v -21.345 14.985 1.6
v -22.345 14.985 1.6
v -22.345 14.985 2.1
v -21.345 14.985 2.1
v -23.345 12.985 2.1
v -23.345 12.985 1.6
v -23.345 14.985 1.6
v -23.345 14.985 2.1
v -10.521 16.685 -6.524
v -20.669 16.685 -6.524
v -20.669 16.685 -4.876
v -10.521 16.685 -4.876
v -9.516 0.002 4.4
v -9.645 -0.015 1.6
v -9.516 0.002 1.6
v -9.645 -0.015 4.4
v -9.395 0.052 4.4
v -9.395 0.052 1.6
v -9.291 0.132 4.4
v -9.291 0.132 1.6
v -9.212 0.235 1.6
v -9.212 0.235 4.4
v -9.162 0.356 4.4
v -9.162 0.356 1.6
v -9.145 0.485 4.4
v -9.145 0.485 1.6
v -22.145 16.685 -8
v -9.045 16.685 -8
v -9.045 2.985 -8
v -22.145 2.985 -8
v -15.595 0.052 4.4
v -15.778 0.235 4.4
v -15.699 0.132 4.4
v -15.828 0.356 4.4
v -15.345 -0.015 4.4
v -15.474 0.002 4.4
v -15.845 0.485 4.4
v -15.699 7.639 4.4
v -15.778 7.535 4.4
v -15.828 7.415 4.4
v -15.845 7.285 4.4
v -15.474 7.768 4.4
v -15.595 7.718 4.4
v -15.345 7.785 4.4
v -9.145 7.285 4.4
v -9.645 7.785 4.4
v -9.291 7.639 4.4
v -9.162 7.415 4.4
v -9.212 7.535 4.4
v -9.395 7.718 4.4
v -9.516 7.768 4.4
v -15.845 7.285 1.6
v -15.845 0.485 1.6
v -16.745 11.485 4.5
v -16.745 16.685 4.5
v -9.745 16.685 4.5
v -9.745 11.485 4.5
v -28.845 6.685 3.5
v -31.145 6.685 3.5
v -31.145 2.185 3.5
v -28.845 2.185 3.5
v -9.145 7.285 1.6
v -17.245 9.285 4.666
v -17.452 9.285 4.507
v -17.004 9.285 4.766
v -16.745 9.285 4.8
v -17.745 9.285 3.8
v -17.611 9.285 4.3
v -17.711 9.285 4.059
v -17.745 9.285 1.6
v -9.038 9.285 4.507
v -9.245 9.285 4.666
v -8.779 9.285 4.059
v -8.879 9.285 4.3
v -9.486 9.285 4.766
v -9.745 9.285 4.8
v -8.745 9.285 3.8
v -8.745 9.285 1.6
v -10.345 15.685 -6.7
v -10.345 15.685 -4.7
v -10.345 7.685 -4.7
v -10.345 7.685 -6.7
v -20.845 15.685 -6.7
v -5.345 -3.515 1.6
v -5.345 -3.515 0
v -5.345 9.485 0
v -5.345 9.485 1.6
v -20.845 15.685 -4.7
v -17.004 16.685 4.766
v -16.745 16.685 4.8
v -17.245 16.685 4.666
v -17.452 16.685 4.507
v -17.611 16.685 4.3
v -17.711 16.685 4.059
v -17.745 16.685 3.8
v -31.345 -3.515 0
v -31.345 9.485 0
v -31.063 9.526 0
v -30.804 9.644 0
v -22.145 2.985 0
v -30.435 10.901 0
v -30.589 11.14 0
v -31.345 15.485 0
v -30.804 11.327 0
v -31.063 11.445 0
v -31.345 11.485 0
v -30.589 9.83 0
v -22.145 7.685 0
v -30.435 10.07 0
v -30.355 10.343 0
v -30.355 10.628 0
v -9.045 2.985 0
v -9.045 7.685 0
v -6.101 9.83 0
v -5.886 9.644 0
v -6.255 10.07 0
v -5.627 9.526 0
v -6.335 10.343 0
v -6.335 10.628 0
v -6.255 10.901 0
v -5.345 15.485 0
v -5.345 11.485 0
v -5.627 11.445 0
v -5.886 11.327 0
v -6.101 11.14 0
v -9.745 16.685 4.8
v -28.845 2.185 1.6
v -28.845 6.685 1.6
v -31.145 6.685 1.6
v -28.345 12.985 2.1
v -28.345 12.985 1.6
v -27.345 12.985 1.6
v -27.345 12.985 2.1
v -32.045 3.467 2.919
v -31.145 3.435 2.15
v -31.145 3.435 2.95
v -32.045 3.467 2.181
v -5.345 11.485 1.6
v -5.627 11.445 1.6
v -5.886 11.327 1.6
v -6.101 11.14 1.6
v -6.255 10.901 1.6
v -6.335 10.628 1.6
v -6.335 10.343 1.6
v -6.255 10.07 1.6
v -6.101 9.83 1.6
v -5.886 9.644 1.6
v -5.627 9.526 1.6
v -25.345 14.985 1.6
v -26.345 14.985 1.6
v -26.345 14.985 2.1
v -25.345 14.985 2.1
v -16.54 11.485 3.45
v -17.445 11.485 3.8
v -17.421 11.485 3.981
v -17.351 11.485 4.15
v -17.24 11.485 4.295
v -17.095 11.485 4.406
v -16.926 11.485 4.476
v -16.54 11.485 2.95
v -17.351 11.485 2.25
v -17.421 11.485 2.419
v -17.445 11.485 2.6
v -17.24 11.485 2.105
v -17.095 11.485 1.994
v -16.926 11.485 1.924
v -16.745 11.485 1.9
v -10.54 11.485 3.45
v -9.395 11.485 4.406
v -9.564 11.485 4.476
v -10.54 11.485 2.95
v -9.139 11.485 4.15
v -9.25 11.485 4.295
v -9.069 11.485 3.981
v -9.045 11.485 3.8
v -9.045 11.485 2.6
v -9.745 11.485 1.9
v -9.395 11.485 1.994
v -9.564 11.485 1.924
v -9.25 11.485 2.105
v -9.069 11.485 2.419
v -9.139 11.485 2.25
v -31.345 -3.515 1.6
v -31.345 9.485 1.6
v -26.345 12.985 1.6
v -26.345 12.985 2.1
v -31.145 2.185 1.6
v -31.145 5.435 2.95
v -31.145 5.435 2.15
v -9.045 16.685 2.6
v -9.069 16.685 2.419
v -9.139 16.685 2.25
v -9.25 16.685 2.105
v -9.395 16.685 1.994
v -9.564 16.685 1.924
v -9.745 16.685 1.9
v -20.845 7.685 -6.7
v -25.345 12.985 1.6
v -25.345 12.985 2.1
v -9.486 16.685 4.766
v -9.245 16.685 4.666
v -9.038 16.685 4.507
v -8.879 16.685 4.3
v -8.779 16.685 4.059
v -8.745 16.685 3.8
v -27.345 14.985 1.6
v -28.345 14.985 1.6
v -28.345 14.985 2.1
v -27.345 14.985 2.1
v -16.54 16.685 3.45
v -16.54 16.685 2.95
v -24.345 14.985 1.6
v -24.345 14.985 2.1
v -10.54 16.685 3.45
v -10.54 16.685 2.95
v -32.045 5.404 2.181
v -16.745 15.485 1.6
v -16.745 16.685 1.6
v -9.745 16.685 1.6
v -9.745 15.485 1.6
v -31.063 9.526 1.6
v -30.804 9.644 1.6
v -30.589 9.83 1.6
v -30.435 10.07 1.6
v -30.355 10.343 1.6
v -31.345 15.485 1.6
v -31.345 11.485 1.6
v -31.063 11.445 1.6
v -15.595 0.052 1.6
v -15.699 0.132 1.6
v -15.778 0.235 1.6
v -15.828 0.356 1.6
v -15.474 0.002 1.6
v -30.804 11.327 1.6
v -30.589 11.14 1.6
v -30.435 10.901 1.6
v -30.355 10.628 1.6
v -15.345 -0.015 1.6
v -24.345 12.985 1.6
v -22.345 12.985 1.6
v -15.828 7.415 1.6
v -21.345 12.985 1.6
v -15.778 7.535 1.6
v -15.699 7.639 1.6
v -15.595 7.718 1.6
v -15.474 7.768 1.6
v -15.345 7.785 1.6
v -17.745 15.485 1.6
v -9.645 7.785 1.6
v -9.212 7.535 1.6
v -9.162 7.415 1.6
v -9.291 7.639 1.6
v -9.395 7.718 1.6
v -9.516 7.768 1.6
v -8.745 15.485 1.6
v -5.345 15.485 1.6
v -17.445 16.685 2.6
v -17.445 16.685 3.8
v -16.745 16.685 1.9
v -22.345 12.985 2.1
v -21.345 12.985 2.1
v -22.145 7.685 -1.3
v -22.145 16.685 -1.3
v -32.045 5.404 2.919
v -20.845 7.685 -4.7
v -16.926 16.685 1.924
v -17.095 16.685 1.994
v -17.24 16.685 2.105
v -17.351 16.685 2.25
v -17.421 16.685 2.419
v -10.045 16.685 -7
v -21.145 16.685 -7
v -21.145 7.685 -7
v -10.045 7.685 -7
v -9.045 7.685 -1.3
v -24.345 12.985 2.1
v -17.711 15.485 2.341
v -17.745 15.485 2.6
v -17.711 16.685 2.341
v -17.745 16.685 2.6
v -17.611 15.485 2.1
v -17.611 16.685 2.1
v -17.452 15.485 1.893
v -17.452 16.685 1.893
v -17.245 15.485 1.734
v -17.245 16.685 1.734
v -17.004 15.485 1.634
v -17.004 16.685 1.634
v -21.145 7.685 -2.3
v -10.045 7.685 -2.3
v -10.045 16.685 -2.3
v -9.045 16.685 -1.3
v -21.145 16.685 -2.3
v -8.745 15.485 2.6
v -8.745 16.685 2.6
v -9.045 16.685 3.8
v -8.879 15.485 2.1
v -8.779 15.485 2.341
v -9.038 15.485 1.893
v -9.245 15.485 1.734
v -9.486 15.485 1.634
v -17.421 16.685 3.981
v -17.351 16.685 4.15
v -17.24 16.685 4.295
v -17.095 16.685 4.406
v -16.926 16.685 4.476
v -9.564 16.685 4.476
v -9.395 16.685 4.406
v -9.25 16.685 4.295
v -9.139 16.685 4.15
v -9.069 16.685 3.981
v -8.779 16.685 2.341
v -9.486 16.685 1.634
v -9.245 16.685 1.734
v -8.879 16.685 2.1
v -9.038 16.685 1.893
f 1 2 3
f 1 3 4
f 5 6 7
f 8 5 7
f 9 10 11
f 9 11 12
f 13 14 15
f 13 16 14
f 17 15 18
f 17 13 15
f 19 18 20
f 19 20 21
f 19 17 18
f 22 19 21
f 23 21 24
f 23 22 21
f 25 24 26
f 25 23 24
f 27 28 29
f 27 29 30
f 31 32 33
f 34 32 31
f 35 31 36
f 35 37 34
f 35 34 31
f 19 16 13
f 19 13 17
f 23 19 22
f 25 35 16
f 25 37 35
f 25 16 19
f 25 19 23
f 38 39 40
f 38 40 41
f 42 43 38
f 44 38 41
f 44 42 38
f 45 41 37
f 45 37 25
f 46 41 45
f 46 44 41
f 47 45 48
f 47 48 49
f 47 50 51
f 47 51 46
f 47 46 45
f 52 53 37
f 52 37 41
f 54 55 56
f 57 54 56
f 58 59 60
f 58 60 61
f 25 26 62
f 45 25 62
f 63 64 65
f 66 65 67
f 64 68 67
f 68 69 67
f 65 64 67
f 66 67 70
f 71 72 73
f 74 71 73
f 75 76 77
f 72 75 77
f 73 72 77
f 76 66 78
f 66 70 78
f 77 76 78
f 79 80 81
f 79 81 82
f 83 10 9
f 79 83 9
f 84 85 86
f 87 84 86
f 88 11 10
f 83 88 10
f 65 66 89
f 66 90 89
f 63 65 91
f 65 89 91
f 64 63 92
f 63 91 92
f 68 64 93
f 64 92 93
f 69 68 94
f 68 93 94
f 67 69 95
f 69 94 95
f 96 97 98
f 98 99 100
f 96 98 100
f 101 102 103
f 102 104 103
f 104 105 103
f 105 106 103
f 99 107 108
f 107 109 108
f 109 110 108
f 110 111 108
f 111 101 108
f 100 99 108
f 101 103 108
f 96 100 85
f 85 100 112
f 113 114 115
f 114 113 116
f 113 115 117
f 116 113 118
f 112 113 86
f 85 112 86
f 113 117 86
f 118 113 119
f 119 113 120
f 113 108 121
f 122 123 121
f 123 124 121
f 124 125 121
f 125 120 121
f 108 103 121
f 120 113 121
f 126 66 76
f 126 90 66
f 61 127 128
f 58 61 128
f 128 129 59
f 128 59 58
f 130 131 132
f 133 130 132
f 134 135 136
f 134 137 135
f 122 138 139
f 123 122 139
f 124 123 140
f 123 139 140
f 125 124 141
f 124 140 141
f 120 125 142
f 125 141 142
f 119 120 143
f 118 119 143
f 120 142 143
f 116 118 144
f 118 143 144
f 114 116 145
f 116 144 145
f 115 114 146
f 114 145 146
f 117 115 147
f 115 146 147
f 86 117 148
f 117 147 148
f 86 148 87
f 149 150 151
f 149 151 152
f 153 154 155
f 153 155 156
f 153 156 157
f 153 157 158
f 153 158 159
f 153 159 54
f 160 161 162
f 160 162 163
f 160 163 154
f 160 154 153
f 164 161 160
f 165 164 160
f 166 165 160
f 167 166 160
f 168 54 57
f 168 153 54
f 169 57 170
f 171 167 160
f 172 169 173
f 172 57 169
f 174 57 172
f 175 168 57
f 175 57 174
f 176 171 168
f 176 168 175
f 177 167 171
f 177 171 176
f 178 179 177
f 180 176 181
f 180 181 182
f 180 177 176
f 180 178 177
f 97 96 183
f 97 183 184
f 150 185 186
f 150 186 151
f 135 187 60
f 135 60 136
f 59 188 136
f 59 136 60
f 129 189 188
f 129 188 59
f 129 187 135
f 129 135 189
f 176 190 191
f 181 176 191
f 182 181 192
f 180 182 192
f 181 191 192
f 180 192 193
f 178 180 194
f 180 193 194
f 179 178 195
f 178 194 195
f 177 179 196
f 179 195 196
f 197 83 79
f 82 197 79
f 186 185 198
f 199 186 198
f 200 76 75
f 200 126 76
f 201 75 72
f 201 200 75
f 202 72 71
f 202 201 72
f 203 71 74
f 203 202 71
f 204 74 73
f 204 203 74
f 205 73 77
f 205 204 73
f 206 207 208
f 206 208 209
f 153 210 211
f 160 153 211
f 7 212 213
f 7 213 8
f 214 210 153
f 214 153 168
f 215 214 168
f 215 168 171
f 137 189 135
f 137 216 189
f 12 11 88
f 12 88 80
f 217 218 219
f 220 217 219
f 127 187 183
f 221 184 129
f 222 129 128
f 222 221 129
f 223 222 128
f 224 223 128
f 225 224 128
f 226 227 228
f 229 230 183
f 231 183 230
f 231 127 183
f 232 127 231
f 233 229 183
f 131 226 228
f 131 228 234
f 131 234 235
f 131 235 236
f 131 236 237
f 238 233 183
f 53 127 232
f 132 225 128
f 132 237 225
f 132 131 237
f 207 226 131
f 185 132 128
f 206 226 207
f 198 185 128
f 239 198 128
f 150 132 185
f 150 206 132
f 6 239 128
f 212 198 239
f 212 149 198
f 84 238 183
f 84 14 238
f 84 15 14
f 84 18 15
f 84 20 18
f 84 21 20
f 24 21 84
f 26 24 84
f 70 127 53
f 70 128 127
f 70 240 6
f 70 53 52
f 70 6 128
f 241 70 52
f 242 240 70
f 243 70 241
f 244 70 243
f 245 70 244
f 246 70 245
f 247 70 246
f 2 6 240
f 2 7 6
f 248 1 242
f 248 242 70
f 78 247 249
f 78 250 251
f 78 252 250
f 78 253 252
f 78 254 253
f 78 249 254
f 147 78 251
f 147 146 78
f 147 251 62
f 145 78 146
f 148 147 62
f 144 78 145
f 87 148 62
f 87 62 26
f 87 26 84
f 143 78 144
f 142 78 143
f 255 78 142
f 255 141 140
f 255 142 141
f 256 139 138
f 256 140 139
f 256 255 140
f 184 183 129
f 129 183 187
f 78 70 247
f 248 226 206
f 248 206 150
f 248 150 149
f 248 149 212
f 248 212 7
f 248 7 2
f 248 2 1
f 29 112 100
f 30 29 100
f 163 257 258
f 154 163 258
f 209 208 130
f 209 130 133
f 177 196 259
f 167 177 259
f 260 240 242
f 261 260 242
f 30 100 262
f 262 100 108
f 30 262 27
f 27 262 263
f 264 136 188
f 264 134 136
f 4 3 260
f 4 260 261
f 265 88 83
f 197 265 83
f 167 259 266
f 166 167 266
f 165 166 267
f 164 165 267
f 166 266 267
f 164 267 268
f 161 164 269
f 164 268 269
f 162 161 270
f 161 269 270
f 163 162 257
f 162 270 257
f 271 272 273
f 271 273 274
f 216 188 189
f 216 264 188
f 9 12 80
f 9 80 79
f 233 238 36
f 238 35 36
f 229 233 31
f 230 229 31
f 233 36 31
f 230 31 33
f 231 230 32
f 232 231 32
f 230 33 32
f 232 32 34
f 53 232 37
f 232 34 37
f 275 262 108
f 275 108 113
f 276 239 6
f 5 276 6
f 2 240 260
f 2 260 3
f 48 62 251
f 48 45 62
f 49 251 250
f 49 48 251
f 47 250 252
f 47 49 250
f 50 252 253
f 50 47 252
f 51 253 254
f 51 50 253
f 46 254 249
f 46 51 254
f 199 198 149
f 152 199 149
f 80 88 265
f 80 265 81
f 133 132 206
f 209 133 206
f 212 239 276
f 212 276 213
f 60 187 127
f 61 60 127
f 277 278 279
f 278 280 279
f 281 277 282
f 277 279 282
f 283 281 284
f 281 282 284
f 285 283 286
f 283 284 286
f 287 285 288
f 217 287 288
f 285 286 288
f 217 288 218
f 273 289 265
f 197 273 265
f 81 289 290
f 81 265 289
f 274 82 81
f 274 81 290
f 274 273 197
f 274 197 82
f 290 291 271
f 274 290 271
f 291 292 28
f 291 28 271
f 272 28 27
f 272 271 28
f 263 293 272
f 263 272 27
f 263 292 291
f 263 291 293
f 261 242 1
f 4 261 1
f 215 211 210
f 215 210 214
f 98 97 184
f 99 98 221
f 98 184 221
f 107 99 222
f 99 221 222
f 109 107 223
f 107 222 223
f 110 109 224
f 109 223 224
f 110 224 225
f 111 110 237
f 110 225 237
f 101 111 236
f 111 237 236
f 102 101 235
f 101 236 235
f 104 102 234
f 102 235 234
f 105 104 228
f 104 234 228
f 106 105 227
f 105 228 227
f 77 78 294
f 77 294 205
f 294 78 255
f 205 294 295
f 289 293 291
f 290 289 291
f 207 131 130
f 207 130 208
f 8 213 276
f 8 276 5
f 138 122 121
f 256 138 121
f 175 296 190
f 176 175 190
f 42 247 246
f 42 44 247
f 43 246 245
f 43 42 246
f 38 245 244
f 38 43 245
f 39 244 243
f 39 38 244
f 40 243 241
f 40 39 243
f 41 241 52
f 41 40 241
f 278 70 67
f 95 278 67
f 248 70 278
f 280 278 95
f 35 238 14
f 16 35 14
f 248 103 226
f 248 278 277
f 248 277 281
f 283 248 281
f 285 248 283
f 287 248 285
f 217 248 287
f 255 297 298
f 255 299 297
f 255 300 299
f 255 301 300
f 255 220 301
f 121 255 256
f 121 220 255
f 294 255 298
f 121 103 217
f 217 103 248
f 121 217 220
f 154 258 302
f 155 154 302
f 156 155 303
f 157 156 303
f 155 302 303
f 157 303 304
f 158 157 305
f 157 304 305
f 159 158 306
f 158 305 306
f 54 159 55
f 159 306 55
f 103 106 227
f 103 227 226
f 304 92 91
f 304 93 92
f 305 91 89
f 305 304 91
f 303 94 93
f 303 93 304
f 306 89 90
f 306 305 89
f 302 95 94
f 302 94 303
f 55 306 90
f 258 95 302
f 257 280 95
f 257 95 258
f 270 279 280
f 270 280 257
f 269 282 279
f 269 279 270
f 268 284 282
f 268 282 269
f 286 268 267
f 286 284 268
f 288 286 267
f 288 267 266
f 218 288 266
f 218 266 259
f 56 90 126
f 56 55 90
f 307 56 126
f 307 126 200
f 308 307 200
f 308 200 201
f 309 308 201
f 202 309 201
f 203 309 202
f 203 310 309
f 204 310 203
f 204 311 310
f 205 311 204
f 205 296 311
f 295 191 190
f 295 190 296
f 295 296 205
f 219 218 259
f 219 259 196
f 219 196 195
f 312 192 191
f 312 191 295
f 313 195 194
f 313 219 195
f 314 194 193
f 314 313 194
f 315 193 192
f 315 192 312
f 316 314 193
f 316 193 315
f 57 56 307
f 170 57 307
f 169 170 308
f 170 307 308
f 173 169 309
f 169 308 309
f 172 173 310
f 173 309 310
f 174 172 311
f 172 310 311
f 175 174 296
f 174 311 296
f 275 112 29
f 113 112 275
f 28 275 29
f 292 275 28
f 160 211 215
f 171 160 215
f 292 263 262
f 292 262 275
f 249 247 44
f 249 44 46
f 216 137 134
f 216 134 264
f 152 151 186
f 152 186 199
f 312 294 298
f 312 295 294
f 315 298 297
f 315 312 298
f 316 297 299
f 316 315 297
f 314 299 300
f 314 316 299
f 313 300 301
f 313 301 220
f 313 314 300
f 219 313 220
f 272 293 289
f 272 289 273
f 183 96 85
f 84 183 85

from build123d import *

# Parameters (mm, degrees)
ESBO_O1_W                = 26
ESBO_O1_H                = 19
RESSALTO_EXTRUS_O1_DEPTH = 1.6
ESBO_O2_W                = 1
ESBO_O2_H                = 2
RESSALTO_EXTRUS_O2_DEPTH = 0.5
ESBO_O3_W                = 9
ESBO_O3_H                = 7.4
RESSALTO_EXTRUS_O3_DEPTH = 3.2
FILETE1_R                = 1
FILETE7_R                = 1
CORTE_EXTRUS_O1_DEPTH    = 5.2
RESSALTO_EXTRUS_O4_REACH = 22.2
ESBO_O5_W                = 6
ESBO_O5_H                = 0.5
ESBO_O6_W                = 6.7
ESBO_O6_H                = 7.8
RESSALTO_EXTRUS_O5_DEPTH = 2.8
FILETE8_R                = 0.5
ESBO_O7_W                = 2.3
ESBO_O7_H                = 4.5
RESSALTO_EXTRUS_O6_DEPTH = 1.9
ESBO_O8_W                = 0.8
ESBO_O8_H                = 2
RESSALTO_EXTRUS_O7_DEPTH = 0.9
RESSALTO_EXTRUS_O7_TAPER = 2
ESBO_O9_W                = 13.1
ESBO_O9_H                = 13.7
RESSALTO_EXTRUS_O8_DEPTH = 8
ESBO_O10_W               = 13.1
ESBO_O10_H               = 1.3
CORTE_EXTRUS_O2_DEPTH    = 9
ESBO_O11_W               = 11.1
ESBO_O11_H               = 4.7
CORTE_EXTRUS_O3_DEPTH    = 9
RESSALTO_EXTRUS_O9_REACH = 22.2
ESBO_O12_W               = 10.5
ESBO_O12_H               = 2
CHANFRO1_SIZE            = 1
CHANFRO1_SIZE2           = 0.176326981
CHANFRO1_PART_2_SIZE     = 1
CHANFRO1_PART_2_SIZE2    = 0.176326981
CHANFRO1_PART_3_SIZE     = 1
CHANFRO1_PART_3_SIZE2    = 0.176326981
CHANFRO1_PART_4_SIZE     = 1
CHANFRO1_PART_4_SIZE2    = 0.176326981
CORTE_EXTRUS_O4_REACH    = 11.6
ESBO_O13_R               = 1


with BuildPart() as part:
    # Esboço1 → Ressalto-extrusão1 (new body)
    with BuildSketch(Plane.XY):
        with Locations((-18.344966746, 5.985294118)):
            Rectangle(ESBO_O1_W, ESBO_O1_H)
    extrude(amount=RESSALTO_EXTRUS_O1_DEPTH)

    # Esboço2 → Ressalto-extrusão2 (add)
    with BuildSketch(Plane.XY.offset(1.6)):
        with Locations((-27.844966746, 13.985294118)):
            Rectangle(ESBO_O2_W, ESBO_O2_H)
        with Locations((-25.844966746, 13.985294118)):
            Rectangle(ESBO_O2_W, ESBO_O2_H)
        with Locations((-23.844966746, 13.985294118)):
            Rectangle(ESBO_O2_W, ESBO_O2_H)
        with Locations((-21.844966746, 13.985294118)):
            Rectangle(ESBO_O2_W, ESBO_O2_H)
    extrude(amount=RESSALTO_EXTRUS_O2_DEPTH)

    # Esboço3 → Ressalto-extrusão3 (add)
    with BuildSketch(Plane.XY.offset(1.6)):
        with Locations((-13.244966746, 12.985294118)):
            Rectangle(ESBO_O3_W, ESBO_O3_H)
    extrude(amount=RESSALTO_EXTRUS_O3_DEPTH)

    # Filete1
    filete1_edges = [part.edges().sort_by_distance(p)[0] for p in [
        (-8.744966746, 12.985294118, 4.8),
    ]]
    fillet(filete1_edges, radius=FILETE1_R)

    # Filete7
    filete7_edges = [part.edges().sort_by_distance(p)[0] for p in [
        (-17.744966746, 16.085294118, 1.6),
        (-8.744966746, 16.085294118, 1.6),
        (-17.744966746, 12.985294118, 4.8),
    ]]
    fillet(filete7_edges, radius=FILETE7_R)

    # Esboço4 → Corte-extrusão1 (cut)
    with BuildSketch(Plane(origin=(0, 16.685294118, 0), x_dir=(1, 0, 0), z_dir=(0, 1, 0))):
        with BuildLine():
            Line((-9.744966746, -1.9), (-16.744966746, -1.9))
            ThreePointArc((-16.744966746, -1.9), (-17.239941493, -2.105025253), (-17.444966746, -2.6))
            Line((-17.444966746, -2.6), (-17.444966746, -3.8))
            ThreePointArc((-17.444966746, -3.8), (-17.239941493, -4.294974747), (-16.744966746, -4.5))
            Line((-16.744966746, -4.5), (-9.744966746, -4.5))
            ThreePointArc((-9.744966746, -4.5), (-9.249991999, -4.294974747), (-9.044966746, -3.8))
            Line((-9.044966746, -3.8), (-9.044966746, -2.6))
            ThreePointArc((-9.044966746, -2.6), (-9.249991999, -2.105025253), (-9.744966746, -1.9))
        make_face()
    extrude(amount=-CORTE_EXTRUS_O1_DEPTH, mode=Mode.SUBTRACT)

    # Esboço5 → Ressalto-extrusão4 (add, up to next)
    with BuildSketch(Plane(origin=(0, 16.685294118, 0), x_dir=(1, 0, 0), z_dir=(0, 1, 0)), mode=Mode.PRIVATE) as ressalto_extrus_o4_sk1:
        with Locations((-13.539619271, -3.2)):
            Rectangle(ESBO_O5_W, ESBO_O5_H)
    ressalto_extrus_o4_tool1 = extrude(ressalto_extrus_o4_sk1.sketch, amount=-RESSALTO_EXTRUS_O4_REACH, mode=Mode.PRIVATE) - part.part
    add(ressalto_extrus_o4_tool1.solids().sort_by_distance((-13.539619, 16.685294, 3.2))[0])

    # Esboço6 → Ressalto-extrusão5 (add)
    with BuildSketch(Plane.XY.offset(1.6)):
        with Locations((-12.494966746, 3.885294118)):
            Rectangle(ESBO_O6_W, ESBO_O6_H)
    extrude(amount=RESSALTO_EXTRUS_O5_DEPTH)

    # Filete8
    filete8_edges = [part.edges().sort_by_distance(p)[0] for p in [
        (-15.844966746, 7.785294118, 3),
        (-15.844966746, -0.014705882, 3),
        (-9.144966746, -0.014705882, 3),
        (-9.144966746, 7.785294118, 3),
    ]]
    fillet(filete8_edges, radius=FILETE8_R)

    # Esboço7 → Ressalto-extrusão6 (add)
    with BuildSketch(Plane.XY.offset(1.6)):
        with Locations((-29.994966746, 4.435294118)):
            Rectangle(ESBO_O7_W, ESBO_O7_H)
    extrude(amount=RESSALTO_EXTRUS_O6_DEPTH)

    # Esboço8 → Ressalto-extrusão7 (add)
    with BuildSketch(Plane.ZY.offset(31.144966746)):
        with Locations((2.55, 4.435294118)):
            Rectangle(ESBO_O8_W, ESBO_O8_H)
    extrude(amount=RESSALTO_EXTRUS_O7_DEPTH, taper=RESSALTO_EXTRUS_O7_TAPER)

    # Esboço9 → Ressalto-extrusão8 (add)
    with BuildSketch(Plane(origin=(0, 0, 0), x_dir=(-1, 0, 0), z_dir=(0, 0, -1))):
        with Locations((15.594966746, 9.835294118)):
            Rectangle(ESBO_O9_W, ESBO_O9_H)
    extrude(amount=RESSALTO_EXTRUS_O8_DEPTH)

    # Esboço10 → Corte-extrusão2 (cut)
    with BuildSketch(Plane(origin=(0, 16.685294118, 0), x_dir=(1, 0, 0), z_dir=(0, 1, 0))):
        with Locations((-15.594966746, 0.65)):
            Rectangle(ESBO_O10_W, ESBO_O10_H)
    extrude(amount=-CORTE_EXTRUS_O2_DEPTH, mode=Mode.SUBTRACT)

    # Esboço11 → Corte-extrusão3 (cut)
    with BuildSketch(Plane(origin=(0, 16.685294118, 0), x_dir=(1, 0, 0), z_dir=(0, 1, 0))):
        with Locations((-15.594966746, 4.65)):
            Rectangle(ESBO_O11_W, ESBO_O11_H)
    extrude(amount=-CORTE_EXTRUS_O3_DEPTH, mode=Mode.SUBTRACT)

    # Esboço12 → Ressalto-extrusão9 (add, up to next)
    with BuildSketch(Plane(origin=(0, 16.685294118, 0), x_dir=(1, 0, 0), z_dir=(0, 1, 0)), mode=Mode.PRIVATE) as ressalto_extrus_o9_sk1:
        with Locations((-15.594966746, 5.7)):
            Rectangle(ESBO_O12_W, ESBO_O12_H)
    ressalto_extrus_o9_tool1 = extrude(ressalto_extrus_o9_sk1.sketch, amount=-RESSALTO_EXTRUS_O9_REACH, mode=Mode.PRIVATE) - part.part
    add(ressalto_extrus_o9_tool1.solids().sort_by_distance((-15.594967, 16.685294, -5.7))[0])

    # Chanfro1
    chanfro1_edges = [part.edges().sort_by_distance(p)[0] for p in [
        (-20.844966746, 16.685294118, -5.7),
    ]]
    chanfro1_side = [part.faces().sort_by_distance(p)[0] for p in [
        (-20.844966746, 12.185294118, -5.7),
    ]]
    chamfer(chanfro1_edges, length=CHANFRO1_SIZE, length2=CHANFRO1_SIZE2, reference=chanfro1_side[0])

    # Chanfro1 part 2
    chanfro1_part_2_edges = [part.edges().sort_by_distance(p)[0] for p in [
        (-15.594966746, 16.685294118, -4.7),
    ]]
    chanfro1_part_2_side = [part.faces().sort_by_distance(p)[0] for p in [
        (-15.594966746, 12.185294118, -4.7),
    ]]
    chamfer(chanfro1_part_2_edges, length=CHANFRO1_PART_2_SIZE, length2=CHANFRO1_PART_2_SIZE2, reference=chanfro1_part_2_side[0])

    # Chanfro1 part 3
    chanfro1_part_3_edges = [part.edges().sort_by_distance(p)[0] for p in [
        (-10.344966746, 16.685294118, -5.7),
    ]]
    chanfro1_part_3_side = [part.faces().sort_by_distance(p)[0] for p in [
        (-10.344966746, 12.185294118, -5.7),
    ]]
    chamfer(chanfro1_part_3_edges, length=CHANFRO1_PART_3_SIZE, length2=CHANFRO1_PART_3_SIZE2, reference=chanfro1_part_3_side[0])

    # Chanfro1 part 4
    chanfro1_part_4_edges = [part.edges().sort_by_distance(p)[0] for p in [
        (-15.594966746, 16.685294118, -6.7),
    ]]
    chanfro1_part_4_side = [part.faces().sort_by_distance(p)[0] for p in [
        (-15.594966746, 12.185294118, -6.7),
    ]]
    chamfer(chanfro1_part_4_edges, length=CHANFRO1_PART_4_SIZE, length2=CHANFRO1_PART_4_SIZE2, reference=chanfro1_part_4_side[0])

    # Esboço13 → Corte-extrusão4 (cut, up to next)
    with BuildSketch(Plane.XY.offset(1.6), mode=Mode.PRIVATE) as corte_extrus_o4_sk1:
        with Locations((-31.344966746, 10.485294118)):
            Circle(ESBO_O13_R)
    corte_extrus_o4_tool1 = extrude(corte_extrus_o4_sk1.sketch, amount=-CORTE_EXTRUS_O4_REACH, mode=Mode.PRIVATE) & part.part
    add(corte_extrus_o4_tool1.solids().sort_by_distance((-31.344967, 10.485294, 1.6))[0], mode=Mode.SUBTRACT)
    # Esboço13 → Corte-extrusão4 (cut, up to next)
    with BuildSketch(Plane.XY.offset(1.6), mode=Mode.PRIVATE) as corte_extrus_o4_sk2:
        with Locations((-5.344966746, 10.485294118)):
            Circle(ESBO_O13_R)
    corte_extrus_o4_tool2 = extrude(corte_extrus_o4_sk2.sketch, amount=-CORTE_EXTRUS_O4_REACH, mode=Mode.PRIVATE) & part.part
    add(corte_extrus_o4_tool2.solids().sort_by_distance((-5.344967, 10.485294, 1.6))[0], mode=Mode.SUBTRACT)


solid = part.part
